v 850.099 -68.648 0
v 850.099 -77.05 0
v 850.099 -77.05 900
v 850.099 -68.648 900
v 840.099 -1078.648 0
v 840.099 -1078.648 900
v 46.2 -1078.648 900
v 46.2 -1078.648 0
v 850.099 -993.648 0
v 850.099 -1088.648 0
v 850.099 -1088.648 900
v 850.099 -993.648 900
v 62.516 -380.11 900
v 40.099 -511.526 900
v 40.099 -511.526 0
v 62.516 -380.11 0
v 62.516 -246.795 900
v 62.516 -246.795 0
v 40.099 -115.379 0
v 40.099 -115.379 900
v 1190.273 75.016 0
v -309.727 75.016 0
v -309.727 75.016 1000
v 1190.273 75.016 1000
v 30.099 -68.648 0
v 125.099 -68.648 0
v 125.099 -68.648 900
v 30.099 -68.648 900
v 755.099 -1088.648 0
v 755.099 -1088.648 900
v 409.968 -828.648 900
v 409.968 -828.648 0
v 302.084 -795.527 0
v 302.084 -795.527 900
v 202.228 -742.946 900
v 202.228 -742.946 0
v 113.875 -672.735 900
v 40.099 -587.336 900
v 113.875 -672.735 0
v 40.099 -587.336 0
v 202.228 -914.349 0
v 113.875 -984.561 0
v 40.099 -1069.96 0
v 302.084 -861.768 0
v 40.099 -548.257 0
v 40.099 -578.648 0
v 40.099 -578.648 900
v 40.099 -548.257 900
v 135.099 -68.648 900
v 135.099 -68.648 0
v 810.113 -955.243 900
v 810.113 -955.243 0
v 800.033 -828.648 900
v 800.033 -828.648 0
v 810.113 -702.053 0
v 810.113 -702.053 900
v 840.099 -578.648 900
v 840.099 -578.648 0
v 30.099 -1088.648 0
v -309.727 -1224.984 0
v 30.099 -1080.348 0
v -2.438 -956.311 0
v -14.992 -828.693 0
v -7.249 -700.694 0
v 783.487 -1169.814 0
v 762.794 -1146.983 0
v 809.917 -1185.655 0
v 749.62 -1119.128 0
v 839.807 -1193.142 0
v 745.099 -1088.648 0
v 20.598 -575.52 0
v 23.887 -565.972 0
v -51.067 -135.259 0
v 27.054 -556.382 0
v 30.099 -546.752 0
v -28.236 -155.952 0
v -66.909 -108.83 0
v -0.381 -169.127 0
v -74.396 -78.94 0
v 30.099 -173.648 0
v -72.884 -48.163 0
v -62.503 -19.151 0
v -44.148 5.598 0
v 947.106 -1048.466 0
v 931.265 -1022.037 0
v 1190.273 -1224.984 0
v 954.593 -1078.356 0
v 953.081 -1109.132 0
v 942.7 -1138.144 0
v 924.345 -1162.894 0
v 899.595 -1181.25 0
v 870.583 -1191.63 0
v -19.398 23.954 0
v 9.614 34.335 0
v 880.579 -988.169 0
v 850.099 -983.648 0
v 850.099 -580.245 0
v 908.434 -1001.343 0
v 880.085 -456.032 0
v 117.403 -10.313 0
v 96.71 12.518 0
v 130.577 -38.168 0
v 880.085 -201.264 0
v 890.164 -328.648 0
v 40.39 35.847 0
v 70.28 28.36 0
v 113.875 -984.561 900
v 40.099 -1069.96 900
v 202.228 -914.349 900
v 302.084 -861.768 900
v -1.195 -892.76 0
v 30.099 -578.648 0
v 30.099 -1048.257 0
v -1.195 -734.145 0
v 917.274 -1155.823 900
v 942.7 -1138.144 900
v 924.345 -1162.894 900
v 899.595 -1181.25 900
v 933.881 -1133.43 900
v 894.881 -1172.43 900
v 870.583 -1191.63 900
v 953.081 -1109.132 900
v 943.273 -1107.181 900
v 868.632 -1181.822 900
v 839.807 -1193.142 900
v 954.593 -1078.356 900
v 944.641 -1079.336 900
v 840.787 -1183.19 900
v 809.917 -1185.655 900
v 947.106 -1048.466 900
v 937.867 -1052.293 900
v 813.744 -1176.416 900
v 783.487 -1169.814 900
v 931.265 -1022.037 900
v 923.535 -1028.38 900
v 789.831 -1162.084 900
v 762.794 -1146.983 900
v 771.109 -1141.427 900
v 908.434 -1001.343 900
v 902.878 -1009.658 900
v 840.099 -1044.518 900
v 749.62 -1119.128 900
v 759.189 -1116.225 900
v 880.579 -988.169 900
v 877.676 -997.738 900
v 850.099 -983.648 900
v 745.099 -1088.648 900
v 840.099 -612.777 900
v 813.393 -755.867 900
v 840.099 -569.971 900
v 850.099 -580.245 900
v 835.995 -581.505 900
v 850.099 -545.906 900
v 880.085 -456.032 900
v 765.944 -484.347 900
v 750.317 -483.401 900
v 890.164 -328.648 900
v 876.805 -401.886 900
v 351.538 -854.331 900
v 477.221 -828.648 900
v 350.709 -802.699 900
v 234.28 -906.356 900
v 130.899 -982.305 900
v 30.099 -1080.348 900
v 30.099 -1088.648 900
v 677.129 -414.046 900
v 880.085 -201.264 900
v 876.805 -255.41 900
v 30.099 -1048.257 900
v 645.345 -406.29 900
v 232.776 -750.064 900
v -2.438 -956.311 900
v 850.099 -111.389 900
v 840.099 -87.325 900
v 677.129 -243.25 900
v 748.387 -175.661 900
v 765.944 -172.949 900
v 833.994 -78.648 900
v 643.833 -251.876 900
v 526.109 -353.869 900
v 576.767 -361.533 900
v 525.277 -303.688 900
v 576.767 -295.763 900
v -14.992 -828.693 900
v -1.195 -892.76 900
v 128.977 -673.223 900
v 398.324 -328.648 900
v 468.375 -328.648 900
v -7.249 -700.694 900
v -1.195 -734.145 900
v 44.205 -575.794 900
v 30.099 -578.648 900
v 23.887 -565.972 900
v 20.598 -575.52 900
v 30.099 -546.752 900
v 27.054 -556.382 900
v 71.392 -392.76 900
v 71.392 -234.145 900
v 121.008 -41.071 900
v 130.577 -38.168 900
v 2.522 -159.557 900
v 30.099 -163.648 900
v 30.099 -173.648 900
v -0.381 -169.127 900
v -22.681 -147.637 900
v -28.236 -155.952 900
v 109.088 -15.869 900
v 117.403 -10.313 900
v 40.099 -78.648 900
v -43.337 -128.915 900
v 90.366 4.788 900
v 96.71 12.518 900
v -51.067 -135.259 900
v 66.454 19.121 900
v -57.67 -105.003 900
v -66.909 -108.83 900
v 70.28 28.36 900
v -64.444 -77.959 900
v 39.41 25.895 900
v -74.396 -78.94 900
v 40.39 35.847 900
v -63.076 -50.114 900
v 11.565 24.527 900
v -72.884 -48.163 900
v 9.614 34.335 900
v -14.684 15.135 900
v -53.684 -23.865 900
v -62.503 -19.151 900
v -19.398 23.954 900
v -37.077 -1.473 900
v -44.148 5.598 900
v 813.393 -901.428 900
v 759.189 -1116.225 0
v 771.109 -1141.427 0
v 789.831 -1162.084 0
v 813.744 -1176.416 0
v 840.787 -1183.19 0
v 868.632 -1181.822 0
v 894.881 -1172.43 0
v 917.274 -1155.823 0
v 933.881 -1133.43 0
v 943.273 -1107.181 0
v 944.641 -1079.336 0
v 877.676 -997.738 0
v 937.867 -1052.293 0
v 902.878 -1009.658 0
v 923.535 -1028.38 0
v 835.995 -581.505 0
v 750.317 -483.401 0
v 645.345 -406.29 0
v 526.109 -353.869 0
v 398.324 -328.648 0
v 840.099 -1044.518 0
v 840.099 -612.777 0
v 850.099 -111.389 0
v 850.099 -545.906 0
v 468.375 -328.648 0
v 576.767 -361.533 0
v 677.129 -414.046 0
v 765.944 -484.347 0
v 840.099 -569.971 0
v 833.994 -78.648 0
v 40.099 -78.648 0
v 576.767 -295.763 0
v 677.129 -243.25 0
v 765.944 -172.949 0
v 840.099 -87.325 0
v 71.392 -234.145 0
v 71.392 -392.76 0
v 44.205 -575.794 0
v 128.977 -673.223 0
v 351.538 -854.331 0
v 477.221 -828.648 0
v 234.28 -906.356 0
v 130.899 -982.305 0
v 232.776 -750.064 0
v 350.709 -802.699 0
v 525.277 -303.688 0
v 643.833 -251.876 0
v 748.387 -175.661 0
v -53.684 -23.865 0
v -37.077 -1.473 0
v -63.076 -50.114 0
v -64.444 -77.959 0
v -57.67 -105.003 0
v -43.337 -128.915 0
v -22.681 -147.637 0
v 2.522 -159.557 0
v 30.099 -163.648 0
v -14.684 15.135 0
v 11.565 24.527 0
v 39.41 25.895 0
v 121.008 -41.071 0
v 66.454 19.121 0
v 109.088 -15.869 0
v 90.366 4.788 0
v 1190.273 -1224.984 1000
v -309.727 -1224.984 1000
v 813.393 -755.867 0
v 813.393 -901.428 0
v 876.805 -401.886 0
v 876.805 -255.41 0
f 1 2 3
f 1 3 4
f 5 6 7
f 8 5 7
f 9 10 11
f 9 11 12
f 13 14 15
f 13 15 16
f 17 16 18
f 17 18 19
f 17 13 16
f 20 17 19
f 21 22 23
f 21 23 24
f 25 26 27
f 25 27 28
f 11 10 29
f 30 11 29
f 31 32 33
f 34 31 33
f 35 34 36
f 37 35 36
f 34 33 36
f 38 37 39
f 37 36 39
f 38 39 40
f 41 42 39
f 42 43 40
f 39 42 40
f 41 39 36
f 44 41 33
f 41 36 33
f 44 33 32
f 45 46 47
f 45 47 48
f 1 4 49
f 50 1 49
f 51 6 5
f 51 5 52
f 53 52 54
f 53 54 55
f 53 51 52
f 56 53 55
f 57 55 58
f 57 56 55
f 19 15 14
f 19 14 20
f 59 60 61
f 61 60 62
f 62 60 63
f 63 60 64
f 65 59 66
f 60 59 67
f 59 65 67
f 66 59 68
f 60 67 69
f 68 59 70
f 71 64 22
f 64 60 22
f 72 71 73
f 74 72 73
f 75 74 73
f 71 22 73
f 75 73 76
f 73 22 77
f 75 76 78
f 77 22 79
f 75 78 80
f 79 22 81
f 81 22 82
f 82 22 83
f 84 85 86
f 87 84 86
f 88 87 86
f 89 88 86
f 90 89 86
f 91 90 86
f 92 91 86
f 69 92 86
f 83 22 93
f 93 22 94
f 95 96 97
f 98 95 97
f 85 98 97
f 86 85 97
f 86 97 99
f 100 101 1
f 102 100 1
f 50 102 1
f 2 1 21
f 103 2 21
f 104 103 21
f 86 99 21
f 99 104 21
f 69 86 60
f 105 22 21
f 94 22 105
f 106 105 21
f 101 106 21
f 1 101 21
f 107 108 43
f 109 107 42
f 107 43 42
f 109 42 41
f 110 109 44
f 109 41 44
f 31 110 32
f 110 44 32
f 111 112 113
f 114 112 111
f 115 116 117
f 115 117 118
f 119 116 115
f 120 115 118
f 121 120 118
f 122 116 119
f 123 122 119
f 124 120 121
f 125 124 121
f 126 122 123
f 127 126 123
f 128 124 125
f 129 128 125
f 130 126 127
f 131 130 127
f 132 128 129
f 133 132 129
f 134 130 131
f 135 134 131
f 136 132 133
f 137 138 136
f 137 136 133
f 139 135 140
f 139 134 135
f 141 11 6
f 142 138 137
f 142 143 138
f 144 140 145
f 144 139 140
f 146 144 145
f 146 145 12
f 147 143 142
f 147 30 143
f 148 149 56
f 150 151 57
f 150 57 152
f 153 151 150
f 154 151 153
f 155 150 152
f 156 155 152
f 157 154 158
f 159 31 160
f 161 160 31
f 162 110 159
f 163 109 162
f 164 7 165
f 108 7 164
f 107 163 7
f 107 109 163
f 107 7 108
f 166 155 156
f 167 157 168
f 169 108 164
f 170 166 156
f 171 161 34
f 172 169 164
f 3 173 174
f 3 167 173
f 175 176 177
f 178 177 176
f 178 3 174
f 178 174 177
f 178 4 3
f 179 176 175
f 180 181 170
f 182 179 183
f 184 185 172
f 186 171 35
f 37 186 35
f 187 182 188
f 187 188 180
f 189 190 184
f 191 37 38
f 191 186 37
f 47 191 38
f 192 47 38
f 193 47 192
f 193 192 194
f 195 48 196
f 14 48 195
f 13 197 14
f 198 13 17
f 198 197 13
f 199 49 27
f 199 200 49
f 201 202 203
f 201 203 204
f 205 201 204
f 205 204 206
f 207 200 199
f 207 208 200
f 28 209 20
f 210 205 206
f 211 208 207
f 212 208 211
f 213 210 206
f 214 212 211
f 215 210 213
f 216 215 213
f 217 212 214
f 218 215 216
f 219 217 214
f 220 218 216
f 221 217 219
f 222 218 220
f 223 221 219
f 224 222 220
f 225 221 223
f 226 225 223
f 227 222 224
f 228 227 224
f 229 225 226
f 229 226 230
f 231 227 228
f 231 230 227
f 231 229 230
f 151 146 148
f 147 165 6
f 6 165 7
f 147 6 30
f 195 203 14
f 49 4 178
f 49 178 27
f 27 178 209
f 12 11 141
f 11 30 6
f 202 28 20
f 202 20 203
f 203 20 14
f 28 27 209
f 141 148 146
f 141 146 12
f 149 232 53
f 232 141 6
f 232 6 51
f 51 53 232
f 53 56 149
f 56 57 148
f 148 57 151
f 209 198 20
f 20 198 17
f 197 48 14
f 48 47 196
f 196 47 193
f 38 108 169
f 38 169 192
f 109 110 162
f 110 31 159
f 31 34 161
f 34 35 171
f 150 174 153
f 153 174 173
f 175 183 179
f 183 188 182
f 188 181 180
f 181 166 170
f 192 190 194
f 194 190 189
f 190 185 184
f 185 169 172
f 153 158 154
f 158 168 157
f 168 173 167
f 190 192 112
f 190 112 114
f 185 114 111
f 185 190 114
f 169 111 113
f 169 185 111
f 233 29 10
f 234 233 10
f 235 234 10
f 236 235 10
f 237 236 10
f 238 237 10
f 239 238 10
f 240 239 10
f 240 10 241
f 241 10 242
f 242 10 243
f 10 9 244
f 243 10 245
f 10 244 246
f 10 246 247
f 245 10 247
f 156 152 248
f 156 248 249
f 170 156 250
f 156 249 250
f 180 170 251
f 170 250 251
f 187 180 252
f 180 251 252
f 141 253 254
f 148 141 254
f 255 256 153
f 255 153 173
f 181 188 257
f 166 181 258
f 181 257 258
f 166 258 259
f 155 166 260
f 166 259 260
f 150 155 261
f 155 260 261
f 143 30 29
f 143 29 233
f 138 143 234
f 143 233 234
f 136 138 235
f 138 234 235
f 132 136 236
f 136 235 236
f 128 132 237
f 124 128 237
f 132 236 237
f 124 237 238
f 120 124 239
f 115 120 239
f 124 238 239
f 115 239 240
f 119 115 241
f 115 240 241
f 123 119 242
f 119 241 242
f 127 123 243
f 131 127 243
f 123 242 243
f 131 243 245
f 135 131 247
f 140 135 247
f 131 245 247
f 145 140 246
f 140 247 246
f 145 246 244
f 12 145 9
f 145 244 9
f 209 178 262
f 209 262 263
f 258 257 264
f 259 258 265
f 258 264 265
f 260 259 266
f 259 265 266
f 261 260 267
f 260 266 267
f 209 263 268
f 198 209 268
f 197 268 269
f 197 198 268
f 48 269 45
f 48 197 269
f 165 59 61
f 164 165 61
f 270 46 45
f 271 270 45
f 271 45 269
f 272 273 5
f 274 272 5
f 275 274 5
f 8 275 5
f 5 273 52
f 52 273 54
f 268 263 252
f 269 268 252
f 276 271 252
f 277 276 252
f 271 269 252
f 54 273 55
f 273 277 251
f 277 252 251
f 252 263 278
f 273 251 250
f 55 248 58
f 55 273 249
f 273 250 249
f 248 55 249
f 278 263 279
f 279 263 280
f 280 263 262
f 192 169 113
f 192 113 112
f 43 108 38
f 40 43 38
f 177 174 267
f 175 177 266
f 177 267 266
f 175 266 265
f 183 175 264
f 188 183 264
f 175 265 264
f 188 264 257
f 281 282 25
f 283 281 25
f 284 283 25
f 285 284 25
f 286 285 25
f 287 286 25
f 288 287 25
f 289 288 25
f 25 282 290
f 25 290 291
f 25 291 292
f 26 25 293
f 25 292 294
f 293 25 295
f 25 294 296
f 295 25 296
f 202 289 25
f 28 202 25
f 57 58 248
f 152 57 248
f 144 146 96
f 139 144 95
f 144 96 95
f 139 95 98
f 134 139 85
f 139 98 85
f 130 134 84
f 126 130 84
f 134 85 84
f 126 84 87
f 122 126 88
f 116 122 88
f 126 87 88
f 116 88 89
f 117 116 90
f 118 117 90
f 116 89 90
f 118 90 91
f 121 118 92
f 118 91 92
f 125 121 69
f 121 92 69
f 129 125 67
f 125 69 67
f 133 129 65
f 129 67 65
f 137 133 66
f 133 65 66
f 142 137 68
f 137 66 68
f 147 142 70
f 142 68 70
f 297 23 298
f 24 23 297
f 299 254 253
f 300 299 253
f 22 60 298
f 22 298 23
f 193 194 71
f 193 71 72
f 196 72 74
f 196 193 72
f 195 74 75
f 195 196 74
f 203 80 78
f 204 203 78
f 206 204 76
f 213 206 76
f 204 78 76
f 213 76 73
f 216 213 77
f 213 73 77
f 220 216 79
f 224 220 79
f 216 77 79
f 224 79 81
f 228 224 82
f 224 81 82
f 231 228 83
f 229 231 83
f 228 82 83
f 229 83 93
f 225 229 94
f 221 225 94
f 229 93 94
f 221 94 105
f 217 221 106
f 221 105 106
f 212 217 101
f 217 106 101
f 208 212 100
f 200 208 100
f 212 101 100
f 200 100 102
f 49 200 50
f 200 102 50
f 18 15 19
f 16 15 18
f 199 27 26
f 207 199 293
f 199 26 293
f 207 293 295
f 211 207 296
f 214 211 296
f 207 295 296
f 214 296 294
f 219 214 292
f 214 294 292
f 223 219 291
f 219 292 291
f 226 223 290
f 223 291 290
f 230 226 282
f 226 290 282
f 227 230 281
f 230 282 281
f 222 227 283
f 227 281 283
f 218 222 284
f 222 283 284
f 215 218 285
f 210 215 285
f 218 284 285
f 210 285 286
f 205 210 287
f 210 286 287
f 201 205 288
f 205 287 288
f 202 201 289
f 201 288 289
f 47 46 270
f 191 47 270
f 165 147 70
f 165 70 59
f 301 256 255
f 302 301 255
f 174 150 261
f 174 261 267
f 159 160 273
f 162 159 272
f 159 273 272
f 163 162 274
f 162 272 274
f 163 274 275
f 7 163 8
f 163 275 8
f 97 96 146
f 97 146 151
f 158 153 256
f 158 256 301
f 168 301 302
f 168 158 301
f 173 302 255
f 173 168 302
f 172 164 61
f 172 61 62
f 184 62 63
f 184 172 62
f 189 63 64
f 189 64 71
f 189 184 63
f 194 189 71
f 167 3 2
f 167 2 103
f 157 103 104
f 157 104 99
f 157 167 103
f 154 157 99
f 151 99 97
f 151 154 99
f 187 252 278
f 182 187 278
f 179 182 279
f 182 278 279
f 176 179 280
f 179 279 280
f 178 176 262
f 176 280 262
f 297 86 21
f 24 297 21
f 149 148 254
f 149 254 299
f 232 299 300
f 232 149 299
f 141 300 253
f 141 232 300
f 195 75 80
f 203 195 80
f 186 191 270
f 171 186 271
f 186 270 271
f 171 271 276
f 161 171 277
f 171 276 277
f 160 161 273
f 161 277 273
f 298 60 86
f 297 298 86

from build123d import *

# Parameters (mm, degrees)
SKETCH1_W                = 1500
SKETCH1_H                = 1300
BOSS_EXTRUDE3_DEPTH      = 1000
SKETCH5_W                = 820
SKETCH5_H                = 1020
SKETCH5_W_2              = 800
SKETCH5_H_2              = 1000
CUT_EXTRUDE_THIN5_DEPTH  = 900
CUT_EXTRUDE_THIN9_START  = -900
CUT_EXTRUDE_THIN9_DEPTH  = 900
CUT_EXTRUDE_THIN25_DEPTH = 900
CUT_EXTRUDE_THIN26_DEPTH = 900


# Read off the part's stored shape, not the designer's step: Cut-Extrude-Thin9
with BuildPart() as part:
    # Sketch1 → Boss-Extrude3 (new body)
    with BuildSketch(Plane(origin=(-226.705899875, 34.53488644, 0), x_dir=(1, 0, 0), z_dir=(0, 0, 1))):
        with Locations((666.978508717, -609.518449502)):
            Rectangle(SKETCH1_W, SKETCH1_H)
    extrude(amount=BOSS_EXTRUDE3_DEPTH)

    # Sketch5 → Cut-Extrude-Thin5 (cut)
    with BuildSketch(Plane(origin=(0, 0, 0), x_dir=(-1, 0, 0), z_dir=(0, 0, -1))):
        with Locations((-440.09863574, -578.647805533)):
            Rectangle(SKETCH5_W, SKETCH5_H)
        with Locations((-440.09863574, -578.647805533)):
            Rectangle(SKETCH5_W_2, SKETCH5_H_2, mode=Mode.SUBTRACT)
    extrude(amount=-CUT_EXTRUDE_THIN5_DEPTH, mode=Mode.SUBTRACT)

    # Cut-Extrude-Thin9 outline → Cut-Extrude-Thin9 (cut)
    with BuildSketch(Plane(origin=(0, 0, 0), x_dir=(-1, 0, 0), z_dir=(0, 0, -1)).offset(CUT_EXTRUDE_THIN9_START)):
        with BuildLine():
            ThreePointArc((-840.09863574, -612.777474084), (-810.032843418, -828.647805533), (-840.09863574, -1044.518136982))
            Line((-840.09863574, -1044.518136982), (-840.09863574, -1078.647805533))
            ThreePointArc((-840.09863574, -1078.647805533), (-800.032843418, -828.647805533), (-840.09863574, -578.647805533))
            Line((-840.09863574, -578.647805533), (-840.09863574, -612.777474084))
        make_face()
        with BuildLine():
            ThreePointArc((-40.09863574, -511.526312309), (-65.332815003, -313.452489118), (-40.09863574, -115.378665927))
            Line((-40.09863574, -115.378665927), (-40.09863574, -78.647805533))
            ThreePointArc((-40.09863574, -78.647805533), (-75.332815003, -313.452489118), (-40.09863574, -548.257172703))
            Line((-40.09863574, -548.257172703), (-40.09863574, -511.526312309))
        make_face()
        with BuildLine():
            ThreePointArc((-20.598154948, -575.520367878), (-25.486318472, -561.181617873), (-30.09863574, -546.751772975))
            Line((-30.09863574, -546.751772975), (-30.09863574, -578.647805533))
            ThreePointArc((-30.09863574, -578.647805533), (5.135543524, -813.452489118), (-30.09863574, -1048.257172703))
            Line((-30.09863574, -1048.257172703), (-30.09863574, -1080.348048155))
            ThreePointArc((-30.09863574, -1080.348048155), (14.992145049, -828.693386929), (-20.598154948, -575.520367878))
        make_face()
        with BuildLine():
            Line((-850.09863574, -111.389167393), (-850.09863574, -77.050278028))
            ThreePointArc((-850.09863574, -77.050278028), (-890.164428061, -328.647805533), (-850.09863574, -580.245333038))
            Line((-850.09863574, -580.245333038), (-850.09863574, -545.906443673))
            ThreePointArc((-850.09863574, -545.906443673), (-880.164428061, -328.647805533), (-850.09863574, -111.389167393))
        make_face()
    extrude(amount=CUT_EXTRUDE_THIN9_DEPTH, mode=Mode.SUBTRACT)

    # Sketch8 → Cut-Extrude-Thin25 (cut)
    with BuildSketch(Plane(origin=(0, 0, 0), x_dir=(-1, 0, 0), z_dir=(0, 0, -1))):
        with BuildLine():
            ThreePointArc((-44.204558678, -575.794492227), (-232.775541237, -750.064076456), (-477.220833635, -828.647805533))
            ThreePointArc((-477.220833635, -828.647805533), (-232.775541237, -907.231534609), (-44.204558678, -1081.501118839))
            Line((-44.204558678, -1081.501118839), (-35.992712801, -1075.794492227))
            ThreePointArc((-35.992712801, -1075.794492227), (-199.246048012, -916.307353384), (-409.967671451, -828.647805533))
            ThreePointArc((-409.967671451, -828.647805533), (-199.246048012, -740.988257682), (-35.992712801, -581.501118839))
            Line((-35.992712801, -581.501118839), (-44.204558678, -575.794492227))
        make_face()
        with BuildLine():
            ThreePointArc((-844.201980979, -81.504824582), (-680.110140526, -241.301950512), (-468.374562106, -328.647805533))
            ThreePointArc((-468.374562106, -328.647805533), (-680.110140526, -415.993660554), (-844.201980979, -575.790786484))
            Line((-844.201980979, -575.790786484), (-835.9952905, -581.504824582))
            ThreePointArc((-835.9952905, -581.504824582), (-645.344725951, -406.290174443), (-398.323524561, -328.647805533))
            ThreePointArc((-398.323524561, -328.647805533), (-645.344725951, -251.005436622), (-835.9952905, -75.790786484))
            Line((-835.9952905, -75.790786484), (-844.201980979, -81.504824582))
        make_face()
    extrude(amount=-CUT_EXTRUDE_THIN25_DEPTH, mode=Mode.SUBTRACT)

    # Sketch9 → Cut-Extrude-Thin26 (cut)
    with BuildSketch(Plane(origin=(0, 0, 0), x_dir=(-1, 0, 0), z_dir=(0, 0, -1))):
        with BuildLine():
            ThreePointArc((-30.09863574, -173.647805533), (44.147576285, 5.598406492), (-135.09863574, -68.647805533))
            Line((-135.09863574, -68.647805533), (-125.09863574, -68.647805533))
            ThreePointArc((-125.09863574, -68.647805533), (37.076508473, -1.47266132), (-30.09863574, -163.647805533))
            Line((-30.09863574, -163.647805533), (-30.09863574, -173.647805533))
        make_face()
        with BuildLine():
            ThreePointArc((-850.09863574, -983.647805533), (-924.344847764, -1162.894017558), (-745.09863574, -1088.647805533))
            Line((-745.09863574, -1088.647805533), (-755.09863574, -1088.647805533))
            ThreePointArc((-755.09863574, -1088.647805533), (-917.273779952, -1155.822949746), (-850.09863574, -993.647805533))
            Line((-850.09863574, -993.647805533), (-850.09863574, -983.647805533))
        make_face()
    extrude(amount=-CUT_EXTRUDE_THIN26_DEPTH, mode=Mode.SUBTRACT)


solid = part.part
